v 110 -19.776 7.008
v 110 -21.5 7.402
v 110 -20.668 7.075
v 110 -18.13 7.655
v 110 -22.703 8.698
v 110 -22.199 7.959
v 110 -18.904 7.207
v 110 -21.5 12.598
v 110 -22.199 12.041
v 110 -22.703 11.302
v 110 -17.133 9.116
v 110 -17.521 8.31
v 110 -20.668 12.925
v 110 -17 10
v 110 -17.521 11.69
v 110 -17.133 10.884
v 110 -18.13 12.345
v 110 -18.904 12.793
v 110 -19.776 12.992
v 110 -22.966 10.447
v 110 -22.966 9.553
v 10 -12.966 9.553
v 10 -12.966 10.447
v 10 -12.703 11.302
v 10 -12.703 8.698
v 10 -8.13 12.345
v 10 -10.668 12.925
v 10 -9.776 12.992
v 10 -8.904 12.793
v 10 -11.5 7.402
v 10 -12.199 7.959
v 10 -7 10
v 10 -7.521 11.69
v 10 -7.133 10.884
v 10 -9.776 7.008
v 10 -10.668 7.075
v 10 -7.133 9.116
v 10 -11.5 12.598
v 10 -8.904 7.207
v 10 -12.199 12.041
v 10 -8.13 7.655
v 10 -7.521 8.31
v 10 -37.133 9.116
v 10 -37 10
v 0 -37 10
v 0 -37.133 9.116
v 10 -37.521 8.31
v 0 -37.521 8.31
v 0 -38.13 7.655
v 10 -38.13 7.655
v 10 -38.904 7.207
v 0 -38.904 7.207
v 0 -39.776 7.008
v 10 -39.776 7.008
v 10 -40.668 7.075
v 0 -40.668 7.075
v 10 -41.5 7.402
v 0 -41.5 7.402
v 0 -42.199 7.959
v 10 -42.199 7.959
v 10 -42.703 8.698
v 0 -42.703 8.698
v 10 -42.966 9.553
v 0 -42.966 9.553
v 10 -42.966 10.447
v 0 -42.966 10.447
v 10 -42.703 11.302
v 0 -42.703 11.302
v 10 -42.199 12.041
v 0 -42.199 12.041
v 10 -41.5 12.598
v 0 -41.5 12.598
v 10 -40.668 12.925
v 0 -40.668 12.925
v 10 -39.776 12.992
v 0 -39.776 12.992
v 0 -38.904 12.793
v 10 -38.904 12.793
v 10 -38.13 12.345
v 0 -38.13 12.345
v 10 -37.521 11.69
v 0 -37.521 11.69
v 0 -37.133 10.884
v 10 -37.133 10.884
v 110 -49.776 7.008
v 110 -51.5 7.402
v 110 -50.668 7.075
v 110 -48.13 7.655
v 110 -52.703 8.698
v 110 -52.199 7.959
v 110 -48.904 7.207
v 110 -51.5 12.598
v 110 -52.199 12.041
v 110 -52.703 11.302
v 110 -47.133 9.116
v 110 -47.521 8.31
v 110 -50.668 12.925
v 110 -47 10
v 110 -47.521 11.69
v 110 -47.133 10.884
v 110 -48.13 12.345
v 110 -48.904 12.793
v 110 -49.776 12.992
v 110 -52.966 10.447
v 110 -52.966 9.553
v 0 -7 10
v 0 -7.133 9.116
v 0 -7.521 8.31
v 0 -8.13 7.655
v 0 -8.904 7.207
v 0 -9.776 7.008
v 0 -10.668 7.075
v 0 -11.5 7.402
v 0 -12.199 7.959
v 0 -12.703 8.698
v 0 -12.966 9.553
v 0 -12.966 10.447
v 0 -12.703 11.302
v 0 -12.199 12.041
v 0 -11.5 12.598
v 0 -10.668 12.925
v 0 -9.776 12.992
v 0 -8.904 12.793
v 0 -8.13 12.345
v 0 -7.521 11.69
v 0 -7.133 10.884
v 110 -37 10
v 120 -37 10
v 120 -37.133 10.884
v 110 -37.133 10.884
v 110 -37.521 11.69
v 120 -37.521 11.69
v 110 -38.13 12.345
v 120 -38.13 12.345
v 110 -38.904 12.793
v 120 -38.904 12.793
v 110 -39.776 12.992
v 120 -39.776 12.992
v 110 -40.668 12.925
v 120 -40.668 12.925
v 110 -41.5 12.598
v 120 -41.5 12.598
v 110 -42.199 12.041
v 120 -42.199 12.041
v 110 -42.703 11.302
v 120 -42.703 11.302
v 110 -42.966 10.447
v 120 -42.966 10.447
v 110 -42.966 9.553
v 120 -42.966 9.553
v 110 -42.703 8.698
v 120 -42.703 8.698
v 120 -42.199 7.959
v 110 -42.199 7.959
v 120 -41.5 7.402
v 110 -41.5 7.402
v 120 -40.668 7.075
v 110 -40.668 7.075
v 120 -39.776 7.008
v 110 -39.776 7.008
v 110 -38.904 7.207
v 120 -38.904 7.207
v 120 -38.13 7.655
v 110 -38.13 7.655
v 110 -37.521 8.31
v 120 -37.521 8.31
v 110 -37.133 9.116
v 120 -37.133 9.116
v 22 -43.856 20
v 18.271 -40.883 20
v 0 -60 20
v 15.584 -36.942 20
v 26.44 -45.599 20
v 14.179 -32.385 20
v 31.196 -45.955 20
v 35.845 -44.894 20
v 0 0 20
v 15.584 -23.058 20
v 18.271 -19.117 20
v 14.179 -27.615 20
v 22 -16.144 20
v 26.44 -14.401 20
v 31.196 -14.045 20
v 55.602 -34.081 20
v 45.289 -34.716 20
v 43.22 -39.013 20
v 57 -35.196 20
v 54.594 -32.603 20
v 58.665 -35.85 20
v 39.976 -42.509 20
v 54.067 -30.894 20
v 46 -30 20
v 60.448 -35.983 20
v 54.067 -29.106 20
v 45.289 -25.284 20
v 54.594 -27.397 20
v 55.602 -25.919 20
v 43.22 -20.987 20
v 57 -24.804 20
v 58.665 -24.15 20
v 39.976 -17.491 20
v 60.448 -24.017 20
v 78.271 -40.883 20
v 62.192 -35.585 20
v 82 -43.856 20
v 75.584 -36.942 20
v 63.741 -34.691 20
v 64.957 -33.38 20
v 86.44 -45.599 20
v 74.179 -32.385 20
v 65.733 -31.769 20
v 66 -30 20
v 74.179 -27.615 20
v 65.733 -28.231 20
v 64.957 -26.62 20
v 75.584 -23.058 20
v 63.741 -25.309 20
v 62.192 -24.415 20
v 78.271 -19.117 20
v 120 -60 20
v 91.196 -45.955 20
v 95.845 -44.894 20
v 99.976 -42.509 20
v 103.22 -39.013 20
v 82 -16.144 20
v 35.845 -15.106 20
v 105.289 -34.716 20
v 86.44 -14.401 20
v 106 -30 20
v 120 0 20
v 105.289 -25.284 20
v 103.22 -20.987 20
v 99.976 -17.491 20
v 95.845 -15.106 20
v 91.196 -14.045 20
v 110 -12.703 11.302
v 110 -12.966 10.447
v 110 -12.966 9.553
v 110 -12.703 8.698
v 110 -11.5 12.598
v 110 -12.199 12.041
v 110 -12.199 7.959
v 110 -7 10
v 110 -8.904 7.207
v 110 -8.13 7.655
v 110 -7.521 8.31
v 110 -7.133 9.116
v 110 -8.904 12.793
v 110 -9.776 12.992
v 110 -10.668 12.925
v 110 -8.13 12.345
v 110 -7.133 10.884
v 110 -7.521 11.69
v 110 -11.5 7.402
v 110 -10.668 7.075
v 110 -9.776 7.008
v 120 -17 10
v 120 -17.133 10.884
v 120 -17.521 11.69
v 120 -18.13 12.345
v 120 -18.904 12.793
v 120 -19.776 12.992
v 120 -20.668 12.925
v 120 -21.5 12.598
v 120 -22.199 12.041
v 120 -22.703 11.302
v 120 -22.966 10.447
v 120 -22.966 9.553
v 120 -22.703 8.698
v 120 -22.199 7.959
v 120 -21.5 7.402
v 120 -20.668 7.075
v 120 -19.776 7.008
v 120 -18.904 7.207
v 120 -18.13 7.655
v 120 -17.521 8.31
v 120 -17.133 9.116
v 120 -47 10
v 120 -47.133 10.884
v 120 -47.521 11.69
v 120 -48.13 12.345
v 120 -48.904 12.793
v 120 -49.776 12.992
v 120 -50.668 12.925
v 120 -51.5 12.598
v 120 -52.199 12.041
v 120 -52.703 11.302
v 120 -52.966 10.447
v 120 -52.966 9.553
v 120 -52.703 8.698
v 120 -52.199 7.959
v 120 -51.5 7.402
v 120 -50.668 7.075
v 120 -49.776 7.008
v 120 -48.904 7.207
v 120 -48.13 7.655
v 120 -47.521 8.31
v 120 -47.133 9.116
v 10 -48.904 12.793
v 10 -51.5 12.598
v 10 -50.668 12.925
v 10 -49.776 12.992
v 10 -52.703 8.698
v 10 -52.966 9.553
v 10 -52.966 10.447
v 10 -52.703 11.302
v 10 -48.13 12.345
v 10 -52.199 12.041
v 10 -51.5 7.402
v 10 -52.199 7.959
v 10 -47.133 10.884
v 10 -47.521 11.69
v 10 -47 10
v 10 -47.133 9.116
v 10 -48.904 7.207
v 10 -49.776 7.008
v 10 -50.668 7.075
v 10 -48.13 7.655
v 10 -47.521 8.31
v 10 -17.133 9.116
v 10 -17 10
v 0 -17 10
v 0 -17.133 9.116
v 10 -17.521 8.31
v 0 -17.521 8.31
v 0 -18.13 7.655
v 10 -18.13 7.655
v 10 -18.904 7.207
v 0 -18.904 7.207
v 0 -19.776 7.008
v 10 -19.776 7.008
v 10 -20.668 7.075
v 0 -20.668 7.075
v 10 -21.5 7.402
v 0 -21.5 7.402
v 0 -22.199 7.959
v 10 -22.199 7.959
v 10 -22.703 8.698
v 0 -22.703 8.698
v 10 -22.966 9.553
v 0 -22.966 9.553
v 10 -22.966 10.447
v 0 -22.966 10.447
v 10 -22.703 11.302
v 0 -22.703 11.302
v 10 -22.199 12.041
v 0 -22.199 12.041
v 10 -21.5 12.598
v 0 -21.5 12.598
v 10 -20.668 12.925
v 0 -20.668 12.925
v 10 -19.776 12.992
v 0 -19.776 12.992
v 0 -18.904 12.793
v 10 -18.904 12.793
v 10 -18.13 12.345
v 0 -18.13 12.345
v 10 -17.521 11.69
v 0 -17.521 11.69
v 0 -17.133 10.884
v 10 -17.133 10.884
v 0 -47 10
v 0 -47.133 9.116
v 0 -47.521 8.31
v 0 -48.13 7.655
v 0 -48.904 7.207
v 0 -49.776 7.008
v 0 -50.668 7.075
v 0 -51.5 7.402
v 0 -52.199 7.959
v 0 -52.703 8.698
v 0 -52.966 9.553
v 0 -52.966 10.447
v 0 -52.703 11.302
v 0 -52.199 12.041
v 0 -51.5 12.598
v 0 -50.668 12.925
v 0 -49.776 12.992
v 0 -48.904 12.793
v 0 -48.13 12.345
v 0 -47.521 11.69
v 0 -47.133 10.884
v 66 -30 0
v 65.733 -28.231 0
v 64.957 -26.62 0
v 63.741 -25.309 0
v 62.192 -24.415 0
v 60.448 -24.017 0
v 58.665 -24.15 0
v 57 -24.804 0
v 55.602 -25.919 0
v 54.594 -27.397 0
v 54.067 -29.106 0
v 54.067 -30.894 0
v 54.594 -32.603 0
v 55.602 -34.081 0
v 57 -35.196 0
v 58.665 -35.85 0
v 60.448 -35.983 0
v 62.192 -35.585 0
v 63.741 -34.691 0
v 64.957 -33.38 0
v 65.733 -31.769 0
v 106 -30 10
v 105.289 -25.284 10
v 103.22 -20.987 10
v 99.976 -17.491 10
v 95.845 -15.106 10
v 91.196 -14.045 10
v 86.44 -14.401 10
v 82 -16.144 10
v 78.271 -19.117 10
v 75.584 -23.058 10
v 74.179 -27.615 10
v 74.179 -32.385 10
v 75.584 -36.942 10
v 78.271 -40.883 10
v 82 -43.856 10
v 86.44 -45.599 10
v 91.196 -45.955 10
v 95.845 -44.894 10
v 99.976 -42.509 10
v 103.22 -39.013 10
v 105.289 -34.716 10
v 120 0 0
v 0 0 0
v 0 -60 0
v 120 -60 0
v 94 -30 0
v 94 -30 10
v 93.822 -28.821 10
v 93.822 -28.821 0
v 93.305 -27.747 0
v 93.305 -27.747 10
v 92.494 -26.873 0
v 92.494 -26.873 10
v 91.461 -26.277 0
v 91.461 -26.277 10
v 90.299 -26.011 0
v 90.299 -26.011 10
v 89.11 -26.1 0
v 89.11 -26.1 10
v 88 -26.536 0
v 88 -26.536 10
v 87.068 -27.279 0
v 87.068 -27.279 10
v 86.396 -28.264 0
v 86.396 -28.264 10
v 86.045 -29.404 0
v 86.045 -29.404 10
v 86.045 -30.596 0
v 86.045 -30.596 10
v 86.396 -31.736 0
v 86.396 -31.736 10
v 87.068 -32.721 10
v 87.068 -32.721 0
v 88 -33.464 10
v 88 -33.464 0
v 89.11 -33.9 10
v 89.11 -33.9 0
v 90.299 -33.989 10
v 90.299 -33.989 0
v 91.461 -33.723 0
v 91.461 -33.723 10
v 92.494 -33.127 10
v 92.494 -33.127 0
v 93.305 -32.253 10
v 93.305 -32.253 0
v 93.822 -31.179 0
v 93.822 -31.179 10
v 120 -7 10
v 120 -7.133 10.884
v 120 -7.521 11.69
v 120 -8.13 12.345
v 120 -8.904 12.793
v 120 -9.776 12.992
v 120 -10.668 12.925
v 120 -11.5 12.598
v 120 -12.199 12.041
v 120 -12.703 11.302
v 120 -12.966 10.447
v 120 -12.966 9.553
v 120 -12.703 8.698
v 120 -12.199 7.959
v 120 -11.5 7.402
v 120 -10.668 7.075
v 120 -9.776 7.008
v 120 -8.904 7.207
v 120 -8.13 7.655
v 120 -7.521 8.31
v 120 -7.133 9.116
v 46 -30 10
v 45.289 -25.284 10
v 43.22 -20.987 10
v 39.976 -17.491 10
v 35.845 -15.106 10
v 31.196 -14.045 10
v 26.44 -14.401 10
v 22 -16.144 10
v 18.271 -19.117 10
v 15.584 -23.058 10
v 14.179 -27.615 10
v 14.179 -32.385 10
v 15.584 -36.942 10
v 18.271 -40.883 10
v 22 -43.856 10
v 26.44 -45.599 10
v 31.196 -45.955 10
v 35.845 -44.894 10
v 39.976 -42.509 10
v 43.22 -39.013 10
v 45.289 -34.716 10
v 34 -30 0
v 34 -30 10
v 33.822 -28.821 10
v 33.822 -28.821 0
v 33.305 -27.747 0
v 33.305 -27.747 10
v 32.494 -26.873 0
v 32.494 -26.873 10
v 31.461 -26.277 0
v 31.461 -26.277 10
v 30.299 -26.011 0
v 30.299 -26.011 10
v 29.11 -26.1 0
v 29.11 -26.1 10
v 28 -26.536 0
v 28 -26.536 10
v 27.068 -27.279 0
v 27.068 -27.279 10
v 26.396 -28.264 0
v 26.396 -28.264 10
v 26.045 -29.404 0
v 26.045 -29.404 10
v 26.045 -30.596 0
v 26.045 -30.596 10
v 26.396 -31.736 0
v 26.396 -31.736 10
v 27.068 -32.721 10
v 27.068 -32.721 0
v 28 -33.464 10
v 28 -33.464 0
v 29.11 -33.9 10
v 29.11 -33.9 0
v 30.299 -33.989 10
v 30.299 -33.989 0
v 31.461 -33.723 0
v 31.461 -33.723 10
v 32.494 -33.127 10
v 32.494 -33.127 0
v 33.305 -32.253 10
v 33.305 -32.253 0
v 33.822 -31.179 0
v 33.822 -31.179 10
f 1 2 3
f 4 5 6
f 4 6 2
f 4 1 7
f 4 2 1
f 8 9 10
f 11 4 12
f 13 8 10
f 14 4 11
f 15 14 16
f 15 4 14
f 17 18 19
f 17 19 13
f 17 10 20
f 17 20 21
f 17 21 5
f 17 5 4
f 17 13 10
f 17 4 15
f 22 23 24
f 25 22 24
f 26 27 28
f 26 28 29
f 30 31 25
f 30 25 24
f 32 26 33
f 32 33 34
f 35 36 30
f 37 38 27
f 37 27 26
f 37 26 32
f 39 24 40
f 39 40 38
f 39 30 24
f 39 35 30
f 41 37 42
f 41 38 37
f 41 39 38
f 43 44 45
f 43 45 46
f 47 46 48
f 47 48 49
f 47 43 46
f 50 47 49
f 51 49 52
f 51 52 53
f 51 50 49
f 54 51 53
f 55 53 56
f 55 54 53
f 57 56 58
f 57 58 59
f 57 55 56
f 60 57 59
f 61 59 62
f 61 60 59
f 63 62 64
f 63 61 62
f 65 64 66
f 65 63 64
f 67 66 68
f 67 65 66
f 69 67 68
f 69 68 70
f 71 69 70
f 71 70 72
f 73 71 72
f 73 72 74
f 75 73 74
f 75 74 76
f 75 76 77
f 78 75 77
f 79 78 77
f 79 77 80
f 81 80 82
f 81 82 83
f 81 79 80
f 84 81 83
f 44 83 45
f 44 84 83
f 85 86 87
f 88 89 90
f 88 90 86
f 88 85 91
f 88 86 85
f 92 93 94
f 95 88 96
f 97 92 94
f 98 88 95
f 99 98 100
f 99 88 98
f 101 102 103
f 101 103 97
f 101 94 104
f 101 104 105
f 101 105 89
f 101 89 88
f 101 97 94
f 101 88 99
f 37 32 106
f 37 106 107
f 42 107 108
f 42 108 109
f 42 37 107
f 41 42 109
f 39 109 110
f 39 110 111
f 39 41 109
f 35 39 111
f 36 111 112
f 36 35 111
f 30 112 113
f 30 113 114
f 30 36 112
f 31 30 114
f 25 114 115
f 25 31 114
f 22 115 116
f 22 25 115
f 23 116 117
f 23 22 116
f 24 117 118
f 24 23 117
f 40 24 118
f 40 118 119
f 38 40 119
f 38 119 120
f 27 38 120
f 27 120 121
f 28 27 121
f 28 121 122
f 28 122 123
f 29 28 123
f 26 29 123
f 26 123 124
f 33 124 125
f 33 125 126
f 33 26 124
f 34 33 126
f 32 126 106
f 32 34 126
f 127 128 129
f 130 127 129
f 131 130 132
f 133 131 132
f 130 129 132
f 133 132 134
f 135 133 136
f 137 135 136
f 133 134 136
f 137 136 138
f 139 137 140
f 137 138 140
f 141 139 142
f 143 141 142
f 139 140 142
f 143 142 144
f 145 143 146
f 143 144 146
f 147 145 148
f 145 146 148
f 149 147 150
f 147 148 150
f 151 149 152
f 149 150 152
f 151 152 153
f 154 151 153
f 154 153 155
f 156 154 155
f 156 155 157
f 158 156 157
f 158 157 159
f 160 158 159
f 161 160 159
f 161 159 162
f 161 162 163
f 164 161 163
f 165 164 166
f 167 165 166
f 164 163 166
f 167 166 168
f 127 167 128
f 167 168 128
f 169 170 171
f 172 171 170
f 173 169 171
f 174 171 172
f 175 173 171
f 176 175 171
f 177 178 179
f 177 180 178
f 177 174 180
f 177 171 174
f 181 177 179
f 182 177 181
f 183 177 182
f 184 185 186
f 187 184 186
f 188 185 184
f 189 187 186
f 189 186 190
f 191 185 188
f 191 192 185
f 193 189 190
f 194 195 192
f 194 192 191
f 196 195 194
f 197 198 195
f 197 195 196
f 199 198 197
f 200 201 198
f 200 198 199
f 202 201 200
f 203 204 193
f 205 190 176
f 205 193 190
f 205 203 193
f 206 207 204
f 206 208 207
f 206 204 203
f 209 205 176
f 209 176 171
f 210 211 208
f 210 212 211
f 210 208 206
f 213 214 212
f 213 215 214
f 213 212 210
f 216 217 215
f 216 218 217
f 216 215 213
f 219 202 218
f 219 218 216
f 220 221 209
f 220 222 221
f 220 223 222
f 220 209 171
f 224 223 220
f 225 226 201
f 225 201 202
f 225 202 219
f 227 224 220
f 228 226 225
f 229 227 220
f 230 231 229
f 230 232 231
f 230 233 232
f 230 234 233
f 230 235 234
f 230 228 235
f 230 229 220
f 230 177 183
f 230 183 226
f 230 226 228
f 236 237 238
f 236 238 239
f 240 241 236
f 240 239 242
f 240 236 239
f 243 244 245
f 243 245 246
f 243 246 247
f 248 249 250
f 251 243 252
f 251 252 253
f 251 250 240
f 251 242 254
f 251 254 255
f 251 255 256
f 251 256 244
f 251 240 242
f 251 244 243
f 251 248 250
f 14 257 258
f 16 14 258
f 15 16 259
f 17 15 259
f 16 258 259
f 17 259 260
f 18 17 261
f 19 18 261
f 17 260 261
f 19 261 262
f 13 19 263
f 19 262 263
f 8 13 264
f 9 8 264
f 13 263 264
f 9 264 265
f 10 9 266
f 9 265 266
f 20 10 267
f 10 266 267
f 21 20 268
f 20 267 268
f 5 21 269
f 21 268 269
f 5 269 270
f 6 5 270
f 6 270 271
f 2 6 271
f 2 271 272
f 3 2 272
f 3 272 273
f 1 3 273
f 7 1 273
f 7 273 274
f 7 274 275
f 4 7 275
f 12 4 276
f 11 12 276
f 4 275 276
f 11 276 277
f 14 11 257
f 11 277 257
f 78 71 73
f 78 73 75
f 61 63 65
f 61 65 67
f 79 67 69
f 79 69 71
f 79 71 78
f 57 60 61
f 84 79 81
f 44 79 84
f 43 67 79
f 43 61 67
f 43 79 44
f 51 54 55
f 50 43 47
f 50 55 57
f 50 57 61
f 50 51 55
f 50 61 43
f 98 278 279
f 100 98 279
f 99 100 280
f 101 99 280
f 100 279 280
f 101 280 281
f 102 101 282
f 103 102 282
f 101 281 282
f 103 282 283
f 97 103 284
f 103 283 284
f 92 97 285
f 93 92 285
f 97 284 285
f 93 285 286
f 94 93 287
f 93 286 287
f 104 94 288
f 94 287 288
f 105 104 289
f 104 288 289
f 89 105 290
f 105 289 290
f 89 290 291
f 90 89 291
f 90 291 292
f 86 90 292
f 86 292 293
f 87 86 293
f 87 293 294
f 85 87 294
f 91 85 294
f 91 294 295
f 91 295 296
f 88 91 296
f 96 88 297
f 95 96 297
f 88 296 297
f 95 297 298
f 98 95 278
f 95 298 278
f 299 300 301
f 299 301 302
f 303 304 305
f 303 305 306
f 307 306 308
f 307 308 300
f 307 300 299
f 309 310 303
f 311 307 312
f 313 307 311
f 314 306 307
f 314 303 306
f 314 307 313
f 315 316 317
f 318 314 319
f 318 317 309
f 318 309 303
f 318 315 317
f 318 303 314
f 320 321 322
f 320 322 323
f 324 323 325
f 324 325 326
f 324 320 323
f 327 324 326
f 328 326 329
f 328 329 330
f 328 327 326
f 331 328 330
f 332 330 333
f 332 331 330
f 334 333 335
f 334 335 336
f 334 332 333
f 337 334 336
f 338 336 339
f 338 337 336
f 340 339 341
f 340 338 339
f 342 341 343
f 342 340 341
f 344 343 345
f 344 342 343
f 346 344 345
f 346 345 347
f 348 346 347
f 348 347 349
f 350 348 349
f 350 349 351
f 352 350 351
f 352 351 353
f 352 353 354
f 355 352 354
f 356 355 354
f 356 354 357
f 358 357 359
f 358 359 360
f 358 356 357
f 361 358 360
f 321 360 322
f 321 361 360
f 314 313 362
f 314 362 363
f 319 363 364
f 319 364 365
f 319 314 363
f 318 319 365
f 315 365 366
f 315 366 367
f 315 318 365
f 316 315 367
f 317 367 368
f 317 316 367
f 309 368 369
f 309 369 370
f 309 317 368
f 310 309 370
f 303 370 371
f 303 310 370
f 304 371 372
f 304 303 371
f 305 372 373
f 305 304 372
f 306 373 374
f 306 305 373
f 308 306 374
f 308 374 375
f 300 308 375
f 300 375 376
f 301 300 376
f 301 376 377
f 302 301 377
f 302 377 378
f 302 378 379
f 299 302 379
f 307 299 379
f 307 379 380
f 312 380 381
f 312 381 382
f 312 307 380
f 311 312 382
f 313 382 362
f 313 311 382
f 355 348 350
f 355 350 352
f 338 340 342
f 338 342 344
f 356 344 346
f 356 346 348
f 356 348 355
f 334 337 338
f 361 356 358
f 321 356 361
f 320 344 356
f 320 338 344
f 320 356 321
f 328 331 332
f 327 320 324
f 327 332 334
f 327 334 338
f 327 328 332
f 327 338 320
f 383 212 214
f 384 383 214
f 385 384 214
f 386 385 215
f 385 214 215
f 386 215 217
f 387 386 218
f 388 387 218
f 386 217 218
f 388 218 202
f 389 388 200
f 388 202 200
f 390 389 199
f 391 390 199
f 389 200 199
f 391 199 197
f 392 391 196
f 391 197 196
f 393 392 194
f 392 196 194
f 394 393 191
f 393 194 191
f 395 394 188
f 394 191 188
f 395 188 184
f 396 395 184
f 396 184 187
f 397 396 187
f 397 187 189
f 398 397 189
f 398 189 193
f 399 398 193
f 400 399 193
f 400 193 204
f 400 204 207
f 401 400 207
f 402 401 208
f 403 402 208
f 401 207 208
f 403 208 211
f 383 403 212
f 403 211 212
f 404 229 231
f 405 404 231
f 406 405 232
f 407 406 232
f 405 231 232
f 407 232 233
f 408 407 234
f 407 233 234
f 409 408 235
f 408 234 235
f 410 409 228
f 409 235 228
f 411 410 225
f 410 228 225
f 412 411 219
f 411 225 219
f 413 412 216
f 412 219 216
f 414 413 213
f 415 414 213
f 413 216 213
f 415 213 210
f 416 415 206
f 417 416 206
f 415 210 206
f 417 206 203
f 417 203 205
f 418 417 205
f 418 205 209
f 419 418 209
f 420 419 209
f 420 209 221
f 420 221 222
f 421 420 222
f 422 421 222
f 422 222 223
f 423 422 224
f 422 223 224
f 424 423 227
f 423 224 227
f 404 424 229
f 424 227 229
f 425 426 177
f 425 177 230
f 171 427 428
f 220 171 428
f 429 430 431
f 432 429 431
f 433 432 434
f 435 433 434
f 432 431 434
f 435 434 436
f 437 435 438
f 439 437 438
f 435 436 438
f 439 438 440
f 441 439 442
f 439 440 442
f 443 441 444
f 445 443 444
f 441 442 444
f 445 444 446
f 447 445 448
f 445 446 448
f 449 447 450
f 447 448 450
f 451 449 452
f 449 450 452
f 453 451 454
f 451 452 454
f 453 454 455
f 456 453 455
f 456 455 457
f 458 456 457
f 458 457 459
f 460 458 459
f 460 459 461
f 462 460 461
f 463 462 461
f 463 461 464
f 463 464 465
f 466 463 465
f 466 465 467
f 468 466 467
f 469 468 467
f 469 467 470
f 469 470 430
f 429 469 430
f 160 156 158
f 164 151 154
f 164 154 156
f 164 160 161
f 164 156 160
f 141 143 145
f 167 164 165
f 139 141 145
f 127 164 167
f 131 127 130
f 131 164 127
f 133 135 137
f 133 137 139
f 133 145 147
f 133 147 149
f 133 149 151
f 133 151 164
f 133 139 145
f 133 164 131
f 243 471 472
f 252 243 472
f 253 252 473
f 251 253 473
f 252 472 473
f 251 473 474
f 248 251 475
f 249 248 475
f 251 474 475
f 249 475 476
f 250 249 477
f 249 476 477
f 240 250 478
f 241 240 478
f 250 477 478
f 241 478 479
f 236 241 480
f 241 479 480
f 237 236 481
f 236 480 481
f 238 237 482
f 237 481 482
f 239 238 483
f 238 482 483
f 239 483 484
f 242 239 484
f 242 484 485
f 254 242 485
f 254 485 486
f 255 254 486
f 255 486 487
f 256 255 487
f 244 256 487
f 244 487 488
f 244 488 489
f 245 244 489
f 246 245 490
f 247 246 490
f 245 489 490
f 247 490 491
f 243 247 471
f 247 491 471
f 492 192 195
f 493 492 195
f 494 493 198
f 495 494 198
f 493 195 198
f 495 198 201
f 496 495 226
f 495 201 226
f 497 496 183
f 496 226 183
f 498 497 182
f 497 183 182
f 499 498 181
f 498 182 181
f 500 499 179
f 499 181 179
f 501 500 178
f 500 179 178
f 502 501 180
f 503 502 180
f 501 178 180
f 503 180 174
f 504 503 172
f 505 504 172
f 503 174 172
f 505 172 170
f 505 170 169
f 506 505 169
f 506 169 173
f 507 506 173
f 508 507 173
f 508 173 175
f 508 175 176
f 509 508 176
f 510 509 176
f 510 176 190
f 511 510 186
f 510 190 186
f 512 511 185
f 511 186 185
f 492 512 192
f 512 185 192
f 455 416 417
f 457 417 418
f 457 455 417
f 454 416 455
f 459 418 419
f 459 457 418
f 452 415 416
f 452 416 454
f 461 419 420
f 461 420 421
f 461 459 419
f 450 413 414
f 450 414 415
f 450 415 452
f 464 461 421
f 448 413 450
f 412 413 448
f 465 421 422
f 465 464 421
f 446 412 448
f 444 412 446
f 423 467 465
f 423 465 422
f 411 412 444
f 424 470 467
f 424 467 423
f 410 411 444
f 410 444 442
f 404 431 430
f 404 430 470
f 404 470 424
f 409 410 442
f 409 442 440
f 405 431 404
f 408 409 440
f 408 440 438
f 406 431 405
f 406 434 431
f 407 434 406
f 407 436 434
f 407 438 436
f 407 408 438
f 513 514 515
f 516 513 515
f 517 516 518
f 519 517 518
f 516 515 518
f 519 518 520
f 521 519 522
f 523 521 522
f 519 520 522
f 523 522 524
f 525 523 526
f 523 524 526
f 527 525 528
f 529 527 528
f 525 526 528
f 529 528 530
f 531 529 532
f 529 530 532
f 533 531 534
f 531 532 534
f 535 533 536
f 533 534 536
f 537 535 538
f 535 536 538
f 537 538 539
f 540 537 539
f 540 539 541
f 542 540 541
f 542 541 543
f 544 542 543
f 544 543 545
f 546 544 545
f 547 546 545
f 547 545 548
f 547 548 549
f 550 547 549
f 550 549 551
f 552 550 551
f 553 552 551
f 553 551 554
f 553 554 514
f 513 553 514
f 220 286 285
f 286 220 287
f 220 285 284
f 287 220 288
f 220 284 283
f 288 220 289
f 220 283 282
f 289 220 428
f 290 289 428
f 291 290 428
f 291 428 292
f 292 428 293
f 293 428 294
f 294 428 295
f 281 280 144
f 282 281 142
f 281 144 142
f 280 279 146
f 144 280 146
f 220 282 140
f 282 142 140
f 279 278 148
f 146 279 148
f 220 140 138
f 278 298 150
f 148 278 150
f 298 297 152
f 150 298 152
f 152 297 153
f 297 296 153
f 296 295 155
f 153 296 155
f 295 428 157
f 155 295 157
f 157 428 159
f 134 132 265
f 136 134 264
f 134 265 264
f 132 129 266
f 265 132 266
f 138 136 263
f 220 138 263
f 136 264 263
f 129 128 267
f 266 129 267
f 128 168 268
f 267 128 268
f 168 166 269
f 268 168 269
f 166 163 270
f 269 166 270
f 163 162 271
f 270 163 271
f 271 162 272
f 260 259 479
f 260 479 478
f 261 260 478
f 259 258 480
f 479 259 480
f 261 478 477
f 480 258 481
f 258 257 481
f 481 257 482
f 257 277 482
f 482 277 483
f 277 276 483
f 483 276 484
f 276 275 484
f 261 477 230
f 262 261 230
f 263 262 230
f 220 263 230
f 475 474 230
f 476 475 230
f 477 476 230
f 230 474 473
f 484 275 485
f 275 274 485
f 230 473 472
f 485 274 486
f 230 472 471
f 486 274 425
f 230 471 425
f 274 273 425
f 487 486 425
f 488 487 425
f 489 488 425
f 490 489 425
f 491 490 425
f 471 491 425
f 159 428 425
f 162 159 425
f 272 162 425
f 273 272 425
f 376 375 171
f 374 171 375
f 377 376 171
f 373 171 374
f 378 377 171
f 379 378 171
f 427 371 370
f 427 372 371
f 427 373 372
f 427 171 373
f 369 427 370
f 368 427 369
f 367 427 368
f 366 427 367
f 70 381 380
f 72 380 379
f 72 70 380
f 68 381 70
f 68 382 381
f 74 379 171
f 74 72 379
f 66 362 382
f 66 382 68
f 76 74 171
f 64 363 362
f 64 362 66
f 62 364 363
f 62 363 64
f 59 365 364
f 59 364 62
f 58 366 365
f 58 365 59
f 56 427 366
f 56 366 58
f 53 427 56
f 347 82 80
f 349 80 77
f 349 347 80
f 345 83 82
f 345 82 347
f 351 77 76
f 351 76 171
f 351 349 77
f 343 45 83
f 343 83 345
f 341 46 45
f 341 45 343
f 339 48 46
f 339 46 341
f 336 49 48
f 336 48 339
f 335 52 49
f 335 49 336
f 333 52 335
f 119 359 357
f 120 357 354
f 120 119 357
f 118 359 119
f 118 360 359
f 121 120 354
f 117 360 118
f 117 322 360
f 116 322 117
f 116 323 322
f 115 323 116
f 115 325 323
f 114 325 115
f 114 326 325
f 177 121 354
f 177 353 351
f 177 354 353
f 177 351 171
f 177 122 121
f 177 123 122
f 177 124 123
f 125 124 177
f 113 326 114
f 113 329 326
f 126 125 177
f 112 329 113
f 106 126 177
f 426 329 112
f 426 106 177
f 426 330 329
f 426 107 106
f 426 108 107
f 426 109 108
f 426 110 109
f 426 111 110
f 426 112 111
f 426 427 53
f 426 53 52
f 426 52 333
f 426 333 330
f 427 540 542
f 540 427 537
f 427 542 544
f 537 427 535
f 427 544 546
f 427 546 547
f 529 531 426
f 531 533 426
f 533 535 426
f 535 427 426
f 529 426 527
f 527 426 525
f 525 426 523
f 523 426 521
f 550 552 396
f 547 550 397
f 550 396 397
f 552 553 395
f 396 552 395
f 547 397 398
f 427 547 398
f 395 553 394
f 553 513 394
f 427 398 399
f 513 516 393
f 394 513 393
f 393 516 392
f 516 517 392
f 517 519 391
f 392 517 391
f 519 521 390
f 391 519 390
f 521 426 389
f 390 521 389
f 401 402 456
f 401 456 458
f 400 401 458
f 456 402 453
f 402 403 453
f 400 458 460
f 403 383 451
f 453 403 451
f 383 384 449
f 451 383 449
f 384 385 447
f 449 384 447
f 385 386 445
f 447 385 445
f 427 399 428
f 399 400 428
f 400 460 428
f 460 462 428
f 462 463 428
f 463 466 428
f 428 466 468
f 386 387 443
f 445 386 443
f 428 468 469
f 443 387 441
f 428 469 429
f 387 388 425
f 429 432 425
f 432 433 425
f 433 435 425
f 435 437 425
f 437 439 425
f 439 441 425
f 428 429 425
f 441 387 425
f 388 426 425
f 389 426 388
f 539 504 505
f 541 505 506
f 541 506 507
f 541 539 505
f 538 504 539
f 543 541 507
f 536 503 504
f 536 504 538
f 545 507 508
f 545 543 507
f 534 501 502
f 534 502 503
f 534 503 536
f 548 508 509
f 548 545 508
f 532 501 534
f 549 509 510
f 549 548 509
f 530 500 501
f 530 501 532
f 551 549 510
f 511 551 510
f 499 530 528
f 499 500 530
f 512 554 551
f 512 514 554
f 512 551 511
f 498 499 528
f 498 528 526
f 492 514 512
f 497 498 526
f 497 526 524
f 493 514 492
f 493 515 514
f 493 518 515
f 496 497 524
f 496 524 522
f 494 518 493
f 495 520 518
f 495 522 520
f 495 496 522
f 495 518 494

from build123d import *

# Parameters (mm, degrees)
SKETCH1_W           = 120
SKETCH1_H           = 60
BOSS_EXTRUDE1_DEPTH = 20
SKETCH2_R           = 4
SKETCH2_R_2         = 6
CUT_EXTRUDE1_DEPTH  = 20
SKETCH3_R           = 16
SKETCH3_R_2         = 4
CUT_EXTRUDE2_DEPTH  = 10
SKETCH4_R           = 3
CUT_EXTRUDE4_DEPTH  = 10
CUT_EXTRUDE5_START  = -10
SKETCH5_R           = 3
CUT_EXTRUDE5_DEPTH  = 10


with BuildPart() as part:
    # Sketch1 → Boss-Extrude1 (new body)
    with BuildSketch(Plane.XY):
        with Locations((60, -30)):
            Rectangle(SKETCH1_W, SKETCH1_H)
    extrude(amount=BOSS_EXTRUDE1_DEPTH)

    # Sketch2 → Cut-Extrude1 (cut)
    with BuildSketch(Plane.XY.offset(20)):
        with Locations((30, -30)):
            Circle(SKETCH2_R)
        with Locations((60, -30)):
            Circle(SKETCH2_R_2)
        with Locations((90, -30)):
            Circle(SKETCH2_R)
    extrude(amount=-CUT_EXTRUDE1_DEPTH, mode=Mode.SUBTRACT)

    # Sketch3 → Cut-Extrude2 (cut)
    # profile 1 of 2: a face of its own
    with BuildSketch(Plane.XY.offset(20)):
        with Locations((30, -30)):
            Circle(SKETCH3_R)
        with Locations((30, -30)):
            Circle(SKETCH3_R_2, mode=Mode.SUBTRACT)
    # profile 2 of 2: a face of its own
    with BuildSketch(Plane.XY.offset(20)):
        with Locations((90, -30)):
            Circle(SKETCH3_R)
        with Locations((90, -30)):
            Circle(SKETCH3_R_2, mode=Mode.SUBTRACT)
    extrude(amount=-CUT_EXTRUDE2_DEPTH, mode=Mode.SUBTRACT)

    # Sketch4 → Cut-Extrude4 (cut)
    with BuildSketch(Plane(origin=(120, 0, 0), x_dir=(0, 0, -1), z_dir=(1, 0, 0))):
        with Locations(Location((-10, -10, 0), (0, 0, 90))):
            Circle(SKETCH4_R)
        with Locations(Location((-10, -20, 0), (0, 0, 90))):
            Circle(SKETCH4_R)
        with Locations(Location((-10, -40, 0), (0, 0, 90))):
            Circle(SKETCH4_R)
        with Locations(Location((-10, -50, 0), (0, 0, 90))):
            Circle(SKETCH4_R)
    extrude(amount=-CUT_EXTRUDE4_DEPTH, mode=Mode.SUBTRACT)

    # Sketch5 → Cut-Extrude5 (cut)
    with BuildSketch(Plane.ZY.offset(CUT_EXTRUDE5_START)):
        with Locations(Location((10, -10, 0), (0, 0, 90))):
            Circle(SKETCH5_R)
        with Locations(Location((10, -20, 0), (0, 0, 90))):
            Circle(SKETCH5_R)
        with Locations(Location((10, -40, 0), (0, 0, 90))):
            Circle(SKETCH5_R)
        with Locations(Location((10, -50, 0), (0, 0, 90))):
            Circle(SKETCH5_R)
    extrude(amount=CUT_EXTRUDE5_DEPTH, mode=Mode.SUBTRACT)


solid = part.part
